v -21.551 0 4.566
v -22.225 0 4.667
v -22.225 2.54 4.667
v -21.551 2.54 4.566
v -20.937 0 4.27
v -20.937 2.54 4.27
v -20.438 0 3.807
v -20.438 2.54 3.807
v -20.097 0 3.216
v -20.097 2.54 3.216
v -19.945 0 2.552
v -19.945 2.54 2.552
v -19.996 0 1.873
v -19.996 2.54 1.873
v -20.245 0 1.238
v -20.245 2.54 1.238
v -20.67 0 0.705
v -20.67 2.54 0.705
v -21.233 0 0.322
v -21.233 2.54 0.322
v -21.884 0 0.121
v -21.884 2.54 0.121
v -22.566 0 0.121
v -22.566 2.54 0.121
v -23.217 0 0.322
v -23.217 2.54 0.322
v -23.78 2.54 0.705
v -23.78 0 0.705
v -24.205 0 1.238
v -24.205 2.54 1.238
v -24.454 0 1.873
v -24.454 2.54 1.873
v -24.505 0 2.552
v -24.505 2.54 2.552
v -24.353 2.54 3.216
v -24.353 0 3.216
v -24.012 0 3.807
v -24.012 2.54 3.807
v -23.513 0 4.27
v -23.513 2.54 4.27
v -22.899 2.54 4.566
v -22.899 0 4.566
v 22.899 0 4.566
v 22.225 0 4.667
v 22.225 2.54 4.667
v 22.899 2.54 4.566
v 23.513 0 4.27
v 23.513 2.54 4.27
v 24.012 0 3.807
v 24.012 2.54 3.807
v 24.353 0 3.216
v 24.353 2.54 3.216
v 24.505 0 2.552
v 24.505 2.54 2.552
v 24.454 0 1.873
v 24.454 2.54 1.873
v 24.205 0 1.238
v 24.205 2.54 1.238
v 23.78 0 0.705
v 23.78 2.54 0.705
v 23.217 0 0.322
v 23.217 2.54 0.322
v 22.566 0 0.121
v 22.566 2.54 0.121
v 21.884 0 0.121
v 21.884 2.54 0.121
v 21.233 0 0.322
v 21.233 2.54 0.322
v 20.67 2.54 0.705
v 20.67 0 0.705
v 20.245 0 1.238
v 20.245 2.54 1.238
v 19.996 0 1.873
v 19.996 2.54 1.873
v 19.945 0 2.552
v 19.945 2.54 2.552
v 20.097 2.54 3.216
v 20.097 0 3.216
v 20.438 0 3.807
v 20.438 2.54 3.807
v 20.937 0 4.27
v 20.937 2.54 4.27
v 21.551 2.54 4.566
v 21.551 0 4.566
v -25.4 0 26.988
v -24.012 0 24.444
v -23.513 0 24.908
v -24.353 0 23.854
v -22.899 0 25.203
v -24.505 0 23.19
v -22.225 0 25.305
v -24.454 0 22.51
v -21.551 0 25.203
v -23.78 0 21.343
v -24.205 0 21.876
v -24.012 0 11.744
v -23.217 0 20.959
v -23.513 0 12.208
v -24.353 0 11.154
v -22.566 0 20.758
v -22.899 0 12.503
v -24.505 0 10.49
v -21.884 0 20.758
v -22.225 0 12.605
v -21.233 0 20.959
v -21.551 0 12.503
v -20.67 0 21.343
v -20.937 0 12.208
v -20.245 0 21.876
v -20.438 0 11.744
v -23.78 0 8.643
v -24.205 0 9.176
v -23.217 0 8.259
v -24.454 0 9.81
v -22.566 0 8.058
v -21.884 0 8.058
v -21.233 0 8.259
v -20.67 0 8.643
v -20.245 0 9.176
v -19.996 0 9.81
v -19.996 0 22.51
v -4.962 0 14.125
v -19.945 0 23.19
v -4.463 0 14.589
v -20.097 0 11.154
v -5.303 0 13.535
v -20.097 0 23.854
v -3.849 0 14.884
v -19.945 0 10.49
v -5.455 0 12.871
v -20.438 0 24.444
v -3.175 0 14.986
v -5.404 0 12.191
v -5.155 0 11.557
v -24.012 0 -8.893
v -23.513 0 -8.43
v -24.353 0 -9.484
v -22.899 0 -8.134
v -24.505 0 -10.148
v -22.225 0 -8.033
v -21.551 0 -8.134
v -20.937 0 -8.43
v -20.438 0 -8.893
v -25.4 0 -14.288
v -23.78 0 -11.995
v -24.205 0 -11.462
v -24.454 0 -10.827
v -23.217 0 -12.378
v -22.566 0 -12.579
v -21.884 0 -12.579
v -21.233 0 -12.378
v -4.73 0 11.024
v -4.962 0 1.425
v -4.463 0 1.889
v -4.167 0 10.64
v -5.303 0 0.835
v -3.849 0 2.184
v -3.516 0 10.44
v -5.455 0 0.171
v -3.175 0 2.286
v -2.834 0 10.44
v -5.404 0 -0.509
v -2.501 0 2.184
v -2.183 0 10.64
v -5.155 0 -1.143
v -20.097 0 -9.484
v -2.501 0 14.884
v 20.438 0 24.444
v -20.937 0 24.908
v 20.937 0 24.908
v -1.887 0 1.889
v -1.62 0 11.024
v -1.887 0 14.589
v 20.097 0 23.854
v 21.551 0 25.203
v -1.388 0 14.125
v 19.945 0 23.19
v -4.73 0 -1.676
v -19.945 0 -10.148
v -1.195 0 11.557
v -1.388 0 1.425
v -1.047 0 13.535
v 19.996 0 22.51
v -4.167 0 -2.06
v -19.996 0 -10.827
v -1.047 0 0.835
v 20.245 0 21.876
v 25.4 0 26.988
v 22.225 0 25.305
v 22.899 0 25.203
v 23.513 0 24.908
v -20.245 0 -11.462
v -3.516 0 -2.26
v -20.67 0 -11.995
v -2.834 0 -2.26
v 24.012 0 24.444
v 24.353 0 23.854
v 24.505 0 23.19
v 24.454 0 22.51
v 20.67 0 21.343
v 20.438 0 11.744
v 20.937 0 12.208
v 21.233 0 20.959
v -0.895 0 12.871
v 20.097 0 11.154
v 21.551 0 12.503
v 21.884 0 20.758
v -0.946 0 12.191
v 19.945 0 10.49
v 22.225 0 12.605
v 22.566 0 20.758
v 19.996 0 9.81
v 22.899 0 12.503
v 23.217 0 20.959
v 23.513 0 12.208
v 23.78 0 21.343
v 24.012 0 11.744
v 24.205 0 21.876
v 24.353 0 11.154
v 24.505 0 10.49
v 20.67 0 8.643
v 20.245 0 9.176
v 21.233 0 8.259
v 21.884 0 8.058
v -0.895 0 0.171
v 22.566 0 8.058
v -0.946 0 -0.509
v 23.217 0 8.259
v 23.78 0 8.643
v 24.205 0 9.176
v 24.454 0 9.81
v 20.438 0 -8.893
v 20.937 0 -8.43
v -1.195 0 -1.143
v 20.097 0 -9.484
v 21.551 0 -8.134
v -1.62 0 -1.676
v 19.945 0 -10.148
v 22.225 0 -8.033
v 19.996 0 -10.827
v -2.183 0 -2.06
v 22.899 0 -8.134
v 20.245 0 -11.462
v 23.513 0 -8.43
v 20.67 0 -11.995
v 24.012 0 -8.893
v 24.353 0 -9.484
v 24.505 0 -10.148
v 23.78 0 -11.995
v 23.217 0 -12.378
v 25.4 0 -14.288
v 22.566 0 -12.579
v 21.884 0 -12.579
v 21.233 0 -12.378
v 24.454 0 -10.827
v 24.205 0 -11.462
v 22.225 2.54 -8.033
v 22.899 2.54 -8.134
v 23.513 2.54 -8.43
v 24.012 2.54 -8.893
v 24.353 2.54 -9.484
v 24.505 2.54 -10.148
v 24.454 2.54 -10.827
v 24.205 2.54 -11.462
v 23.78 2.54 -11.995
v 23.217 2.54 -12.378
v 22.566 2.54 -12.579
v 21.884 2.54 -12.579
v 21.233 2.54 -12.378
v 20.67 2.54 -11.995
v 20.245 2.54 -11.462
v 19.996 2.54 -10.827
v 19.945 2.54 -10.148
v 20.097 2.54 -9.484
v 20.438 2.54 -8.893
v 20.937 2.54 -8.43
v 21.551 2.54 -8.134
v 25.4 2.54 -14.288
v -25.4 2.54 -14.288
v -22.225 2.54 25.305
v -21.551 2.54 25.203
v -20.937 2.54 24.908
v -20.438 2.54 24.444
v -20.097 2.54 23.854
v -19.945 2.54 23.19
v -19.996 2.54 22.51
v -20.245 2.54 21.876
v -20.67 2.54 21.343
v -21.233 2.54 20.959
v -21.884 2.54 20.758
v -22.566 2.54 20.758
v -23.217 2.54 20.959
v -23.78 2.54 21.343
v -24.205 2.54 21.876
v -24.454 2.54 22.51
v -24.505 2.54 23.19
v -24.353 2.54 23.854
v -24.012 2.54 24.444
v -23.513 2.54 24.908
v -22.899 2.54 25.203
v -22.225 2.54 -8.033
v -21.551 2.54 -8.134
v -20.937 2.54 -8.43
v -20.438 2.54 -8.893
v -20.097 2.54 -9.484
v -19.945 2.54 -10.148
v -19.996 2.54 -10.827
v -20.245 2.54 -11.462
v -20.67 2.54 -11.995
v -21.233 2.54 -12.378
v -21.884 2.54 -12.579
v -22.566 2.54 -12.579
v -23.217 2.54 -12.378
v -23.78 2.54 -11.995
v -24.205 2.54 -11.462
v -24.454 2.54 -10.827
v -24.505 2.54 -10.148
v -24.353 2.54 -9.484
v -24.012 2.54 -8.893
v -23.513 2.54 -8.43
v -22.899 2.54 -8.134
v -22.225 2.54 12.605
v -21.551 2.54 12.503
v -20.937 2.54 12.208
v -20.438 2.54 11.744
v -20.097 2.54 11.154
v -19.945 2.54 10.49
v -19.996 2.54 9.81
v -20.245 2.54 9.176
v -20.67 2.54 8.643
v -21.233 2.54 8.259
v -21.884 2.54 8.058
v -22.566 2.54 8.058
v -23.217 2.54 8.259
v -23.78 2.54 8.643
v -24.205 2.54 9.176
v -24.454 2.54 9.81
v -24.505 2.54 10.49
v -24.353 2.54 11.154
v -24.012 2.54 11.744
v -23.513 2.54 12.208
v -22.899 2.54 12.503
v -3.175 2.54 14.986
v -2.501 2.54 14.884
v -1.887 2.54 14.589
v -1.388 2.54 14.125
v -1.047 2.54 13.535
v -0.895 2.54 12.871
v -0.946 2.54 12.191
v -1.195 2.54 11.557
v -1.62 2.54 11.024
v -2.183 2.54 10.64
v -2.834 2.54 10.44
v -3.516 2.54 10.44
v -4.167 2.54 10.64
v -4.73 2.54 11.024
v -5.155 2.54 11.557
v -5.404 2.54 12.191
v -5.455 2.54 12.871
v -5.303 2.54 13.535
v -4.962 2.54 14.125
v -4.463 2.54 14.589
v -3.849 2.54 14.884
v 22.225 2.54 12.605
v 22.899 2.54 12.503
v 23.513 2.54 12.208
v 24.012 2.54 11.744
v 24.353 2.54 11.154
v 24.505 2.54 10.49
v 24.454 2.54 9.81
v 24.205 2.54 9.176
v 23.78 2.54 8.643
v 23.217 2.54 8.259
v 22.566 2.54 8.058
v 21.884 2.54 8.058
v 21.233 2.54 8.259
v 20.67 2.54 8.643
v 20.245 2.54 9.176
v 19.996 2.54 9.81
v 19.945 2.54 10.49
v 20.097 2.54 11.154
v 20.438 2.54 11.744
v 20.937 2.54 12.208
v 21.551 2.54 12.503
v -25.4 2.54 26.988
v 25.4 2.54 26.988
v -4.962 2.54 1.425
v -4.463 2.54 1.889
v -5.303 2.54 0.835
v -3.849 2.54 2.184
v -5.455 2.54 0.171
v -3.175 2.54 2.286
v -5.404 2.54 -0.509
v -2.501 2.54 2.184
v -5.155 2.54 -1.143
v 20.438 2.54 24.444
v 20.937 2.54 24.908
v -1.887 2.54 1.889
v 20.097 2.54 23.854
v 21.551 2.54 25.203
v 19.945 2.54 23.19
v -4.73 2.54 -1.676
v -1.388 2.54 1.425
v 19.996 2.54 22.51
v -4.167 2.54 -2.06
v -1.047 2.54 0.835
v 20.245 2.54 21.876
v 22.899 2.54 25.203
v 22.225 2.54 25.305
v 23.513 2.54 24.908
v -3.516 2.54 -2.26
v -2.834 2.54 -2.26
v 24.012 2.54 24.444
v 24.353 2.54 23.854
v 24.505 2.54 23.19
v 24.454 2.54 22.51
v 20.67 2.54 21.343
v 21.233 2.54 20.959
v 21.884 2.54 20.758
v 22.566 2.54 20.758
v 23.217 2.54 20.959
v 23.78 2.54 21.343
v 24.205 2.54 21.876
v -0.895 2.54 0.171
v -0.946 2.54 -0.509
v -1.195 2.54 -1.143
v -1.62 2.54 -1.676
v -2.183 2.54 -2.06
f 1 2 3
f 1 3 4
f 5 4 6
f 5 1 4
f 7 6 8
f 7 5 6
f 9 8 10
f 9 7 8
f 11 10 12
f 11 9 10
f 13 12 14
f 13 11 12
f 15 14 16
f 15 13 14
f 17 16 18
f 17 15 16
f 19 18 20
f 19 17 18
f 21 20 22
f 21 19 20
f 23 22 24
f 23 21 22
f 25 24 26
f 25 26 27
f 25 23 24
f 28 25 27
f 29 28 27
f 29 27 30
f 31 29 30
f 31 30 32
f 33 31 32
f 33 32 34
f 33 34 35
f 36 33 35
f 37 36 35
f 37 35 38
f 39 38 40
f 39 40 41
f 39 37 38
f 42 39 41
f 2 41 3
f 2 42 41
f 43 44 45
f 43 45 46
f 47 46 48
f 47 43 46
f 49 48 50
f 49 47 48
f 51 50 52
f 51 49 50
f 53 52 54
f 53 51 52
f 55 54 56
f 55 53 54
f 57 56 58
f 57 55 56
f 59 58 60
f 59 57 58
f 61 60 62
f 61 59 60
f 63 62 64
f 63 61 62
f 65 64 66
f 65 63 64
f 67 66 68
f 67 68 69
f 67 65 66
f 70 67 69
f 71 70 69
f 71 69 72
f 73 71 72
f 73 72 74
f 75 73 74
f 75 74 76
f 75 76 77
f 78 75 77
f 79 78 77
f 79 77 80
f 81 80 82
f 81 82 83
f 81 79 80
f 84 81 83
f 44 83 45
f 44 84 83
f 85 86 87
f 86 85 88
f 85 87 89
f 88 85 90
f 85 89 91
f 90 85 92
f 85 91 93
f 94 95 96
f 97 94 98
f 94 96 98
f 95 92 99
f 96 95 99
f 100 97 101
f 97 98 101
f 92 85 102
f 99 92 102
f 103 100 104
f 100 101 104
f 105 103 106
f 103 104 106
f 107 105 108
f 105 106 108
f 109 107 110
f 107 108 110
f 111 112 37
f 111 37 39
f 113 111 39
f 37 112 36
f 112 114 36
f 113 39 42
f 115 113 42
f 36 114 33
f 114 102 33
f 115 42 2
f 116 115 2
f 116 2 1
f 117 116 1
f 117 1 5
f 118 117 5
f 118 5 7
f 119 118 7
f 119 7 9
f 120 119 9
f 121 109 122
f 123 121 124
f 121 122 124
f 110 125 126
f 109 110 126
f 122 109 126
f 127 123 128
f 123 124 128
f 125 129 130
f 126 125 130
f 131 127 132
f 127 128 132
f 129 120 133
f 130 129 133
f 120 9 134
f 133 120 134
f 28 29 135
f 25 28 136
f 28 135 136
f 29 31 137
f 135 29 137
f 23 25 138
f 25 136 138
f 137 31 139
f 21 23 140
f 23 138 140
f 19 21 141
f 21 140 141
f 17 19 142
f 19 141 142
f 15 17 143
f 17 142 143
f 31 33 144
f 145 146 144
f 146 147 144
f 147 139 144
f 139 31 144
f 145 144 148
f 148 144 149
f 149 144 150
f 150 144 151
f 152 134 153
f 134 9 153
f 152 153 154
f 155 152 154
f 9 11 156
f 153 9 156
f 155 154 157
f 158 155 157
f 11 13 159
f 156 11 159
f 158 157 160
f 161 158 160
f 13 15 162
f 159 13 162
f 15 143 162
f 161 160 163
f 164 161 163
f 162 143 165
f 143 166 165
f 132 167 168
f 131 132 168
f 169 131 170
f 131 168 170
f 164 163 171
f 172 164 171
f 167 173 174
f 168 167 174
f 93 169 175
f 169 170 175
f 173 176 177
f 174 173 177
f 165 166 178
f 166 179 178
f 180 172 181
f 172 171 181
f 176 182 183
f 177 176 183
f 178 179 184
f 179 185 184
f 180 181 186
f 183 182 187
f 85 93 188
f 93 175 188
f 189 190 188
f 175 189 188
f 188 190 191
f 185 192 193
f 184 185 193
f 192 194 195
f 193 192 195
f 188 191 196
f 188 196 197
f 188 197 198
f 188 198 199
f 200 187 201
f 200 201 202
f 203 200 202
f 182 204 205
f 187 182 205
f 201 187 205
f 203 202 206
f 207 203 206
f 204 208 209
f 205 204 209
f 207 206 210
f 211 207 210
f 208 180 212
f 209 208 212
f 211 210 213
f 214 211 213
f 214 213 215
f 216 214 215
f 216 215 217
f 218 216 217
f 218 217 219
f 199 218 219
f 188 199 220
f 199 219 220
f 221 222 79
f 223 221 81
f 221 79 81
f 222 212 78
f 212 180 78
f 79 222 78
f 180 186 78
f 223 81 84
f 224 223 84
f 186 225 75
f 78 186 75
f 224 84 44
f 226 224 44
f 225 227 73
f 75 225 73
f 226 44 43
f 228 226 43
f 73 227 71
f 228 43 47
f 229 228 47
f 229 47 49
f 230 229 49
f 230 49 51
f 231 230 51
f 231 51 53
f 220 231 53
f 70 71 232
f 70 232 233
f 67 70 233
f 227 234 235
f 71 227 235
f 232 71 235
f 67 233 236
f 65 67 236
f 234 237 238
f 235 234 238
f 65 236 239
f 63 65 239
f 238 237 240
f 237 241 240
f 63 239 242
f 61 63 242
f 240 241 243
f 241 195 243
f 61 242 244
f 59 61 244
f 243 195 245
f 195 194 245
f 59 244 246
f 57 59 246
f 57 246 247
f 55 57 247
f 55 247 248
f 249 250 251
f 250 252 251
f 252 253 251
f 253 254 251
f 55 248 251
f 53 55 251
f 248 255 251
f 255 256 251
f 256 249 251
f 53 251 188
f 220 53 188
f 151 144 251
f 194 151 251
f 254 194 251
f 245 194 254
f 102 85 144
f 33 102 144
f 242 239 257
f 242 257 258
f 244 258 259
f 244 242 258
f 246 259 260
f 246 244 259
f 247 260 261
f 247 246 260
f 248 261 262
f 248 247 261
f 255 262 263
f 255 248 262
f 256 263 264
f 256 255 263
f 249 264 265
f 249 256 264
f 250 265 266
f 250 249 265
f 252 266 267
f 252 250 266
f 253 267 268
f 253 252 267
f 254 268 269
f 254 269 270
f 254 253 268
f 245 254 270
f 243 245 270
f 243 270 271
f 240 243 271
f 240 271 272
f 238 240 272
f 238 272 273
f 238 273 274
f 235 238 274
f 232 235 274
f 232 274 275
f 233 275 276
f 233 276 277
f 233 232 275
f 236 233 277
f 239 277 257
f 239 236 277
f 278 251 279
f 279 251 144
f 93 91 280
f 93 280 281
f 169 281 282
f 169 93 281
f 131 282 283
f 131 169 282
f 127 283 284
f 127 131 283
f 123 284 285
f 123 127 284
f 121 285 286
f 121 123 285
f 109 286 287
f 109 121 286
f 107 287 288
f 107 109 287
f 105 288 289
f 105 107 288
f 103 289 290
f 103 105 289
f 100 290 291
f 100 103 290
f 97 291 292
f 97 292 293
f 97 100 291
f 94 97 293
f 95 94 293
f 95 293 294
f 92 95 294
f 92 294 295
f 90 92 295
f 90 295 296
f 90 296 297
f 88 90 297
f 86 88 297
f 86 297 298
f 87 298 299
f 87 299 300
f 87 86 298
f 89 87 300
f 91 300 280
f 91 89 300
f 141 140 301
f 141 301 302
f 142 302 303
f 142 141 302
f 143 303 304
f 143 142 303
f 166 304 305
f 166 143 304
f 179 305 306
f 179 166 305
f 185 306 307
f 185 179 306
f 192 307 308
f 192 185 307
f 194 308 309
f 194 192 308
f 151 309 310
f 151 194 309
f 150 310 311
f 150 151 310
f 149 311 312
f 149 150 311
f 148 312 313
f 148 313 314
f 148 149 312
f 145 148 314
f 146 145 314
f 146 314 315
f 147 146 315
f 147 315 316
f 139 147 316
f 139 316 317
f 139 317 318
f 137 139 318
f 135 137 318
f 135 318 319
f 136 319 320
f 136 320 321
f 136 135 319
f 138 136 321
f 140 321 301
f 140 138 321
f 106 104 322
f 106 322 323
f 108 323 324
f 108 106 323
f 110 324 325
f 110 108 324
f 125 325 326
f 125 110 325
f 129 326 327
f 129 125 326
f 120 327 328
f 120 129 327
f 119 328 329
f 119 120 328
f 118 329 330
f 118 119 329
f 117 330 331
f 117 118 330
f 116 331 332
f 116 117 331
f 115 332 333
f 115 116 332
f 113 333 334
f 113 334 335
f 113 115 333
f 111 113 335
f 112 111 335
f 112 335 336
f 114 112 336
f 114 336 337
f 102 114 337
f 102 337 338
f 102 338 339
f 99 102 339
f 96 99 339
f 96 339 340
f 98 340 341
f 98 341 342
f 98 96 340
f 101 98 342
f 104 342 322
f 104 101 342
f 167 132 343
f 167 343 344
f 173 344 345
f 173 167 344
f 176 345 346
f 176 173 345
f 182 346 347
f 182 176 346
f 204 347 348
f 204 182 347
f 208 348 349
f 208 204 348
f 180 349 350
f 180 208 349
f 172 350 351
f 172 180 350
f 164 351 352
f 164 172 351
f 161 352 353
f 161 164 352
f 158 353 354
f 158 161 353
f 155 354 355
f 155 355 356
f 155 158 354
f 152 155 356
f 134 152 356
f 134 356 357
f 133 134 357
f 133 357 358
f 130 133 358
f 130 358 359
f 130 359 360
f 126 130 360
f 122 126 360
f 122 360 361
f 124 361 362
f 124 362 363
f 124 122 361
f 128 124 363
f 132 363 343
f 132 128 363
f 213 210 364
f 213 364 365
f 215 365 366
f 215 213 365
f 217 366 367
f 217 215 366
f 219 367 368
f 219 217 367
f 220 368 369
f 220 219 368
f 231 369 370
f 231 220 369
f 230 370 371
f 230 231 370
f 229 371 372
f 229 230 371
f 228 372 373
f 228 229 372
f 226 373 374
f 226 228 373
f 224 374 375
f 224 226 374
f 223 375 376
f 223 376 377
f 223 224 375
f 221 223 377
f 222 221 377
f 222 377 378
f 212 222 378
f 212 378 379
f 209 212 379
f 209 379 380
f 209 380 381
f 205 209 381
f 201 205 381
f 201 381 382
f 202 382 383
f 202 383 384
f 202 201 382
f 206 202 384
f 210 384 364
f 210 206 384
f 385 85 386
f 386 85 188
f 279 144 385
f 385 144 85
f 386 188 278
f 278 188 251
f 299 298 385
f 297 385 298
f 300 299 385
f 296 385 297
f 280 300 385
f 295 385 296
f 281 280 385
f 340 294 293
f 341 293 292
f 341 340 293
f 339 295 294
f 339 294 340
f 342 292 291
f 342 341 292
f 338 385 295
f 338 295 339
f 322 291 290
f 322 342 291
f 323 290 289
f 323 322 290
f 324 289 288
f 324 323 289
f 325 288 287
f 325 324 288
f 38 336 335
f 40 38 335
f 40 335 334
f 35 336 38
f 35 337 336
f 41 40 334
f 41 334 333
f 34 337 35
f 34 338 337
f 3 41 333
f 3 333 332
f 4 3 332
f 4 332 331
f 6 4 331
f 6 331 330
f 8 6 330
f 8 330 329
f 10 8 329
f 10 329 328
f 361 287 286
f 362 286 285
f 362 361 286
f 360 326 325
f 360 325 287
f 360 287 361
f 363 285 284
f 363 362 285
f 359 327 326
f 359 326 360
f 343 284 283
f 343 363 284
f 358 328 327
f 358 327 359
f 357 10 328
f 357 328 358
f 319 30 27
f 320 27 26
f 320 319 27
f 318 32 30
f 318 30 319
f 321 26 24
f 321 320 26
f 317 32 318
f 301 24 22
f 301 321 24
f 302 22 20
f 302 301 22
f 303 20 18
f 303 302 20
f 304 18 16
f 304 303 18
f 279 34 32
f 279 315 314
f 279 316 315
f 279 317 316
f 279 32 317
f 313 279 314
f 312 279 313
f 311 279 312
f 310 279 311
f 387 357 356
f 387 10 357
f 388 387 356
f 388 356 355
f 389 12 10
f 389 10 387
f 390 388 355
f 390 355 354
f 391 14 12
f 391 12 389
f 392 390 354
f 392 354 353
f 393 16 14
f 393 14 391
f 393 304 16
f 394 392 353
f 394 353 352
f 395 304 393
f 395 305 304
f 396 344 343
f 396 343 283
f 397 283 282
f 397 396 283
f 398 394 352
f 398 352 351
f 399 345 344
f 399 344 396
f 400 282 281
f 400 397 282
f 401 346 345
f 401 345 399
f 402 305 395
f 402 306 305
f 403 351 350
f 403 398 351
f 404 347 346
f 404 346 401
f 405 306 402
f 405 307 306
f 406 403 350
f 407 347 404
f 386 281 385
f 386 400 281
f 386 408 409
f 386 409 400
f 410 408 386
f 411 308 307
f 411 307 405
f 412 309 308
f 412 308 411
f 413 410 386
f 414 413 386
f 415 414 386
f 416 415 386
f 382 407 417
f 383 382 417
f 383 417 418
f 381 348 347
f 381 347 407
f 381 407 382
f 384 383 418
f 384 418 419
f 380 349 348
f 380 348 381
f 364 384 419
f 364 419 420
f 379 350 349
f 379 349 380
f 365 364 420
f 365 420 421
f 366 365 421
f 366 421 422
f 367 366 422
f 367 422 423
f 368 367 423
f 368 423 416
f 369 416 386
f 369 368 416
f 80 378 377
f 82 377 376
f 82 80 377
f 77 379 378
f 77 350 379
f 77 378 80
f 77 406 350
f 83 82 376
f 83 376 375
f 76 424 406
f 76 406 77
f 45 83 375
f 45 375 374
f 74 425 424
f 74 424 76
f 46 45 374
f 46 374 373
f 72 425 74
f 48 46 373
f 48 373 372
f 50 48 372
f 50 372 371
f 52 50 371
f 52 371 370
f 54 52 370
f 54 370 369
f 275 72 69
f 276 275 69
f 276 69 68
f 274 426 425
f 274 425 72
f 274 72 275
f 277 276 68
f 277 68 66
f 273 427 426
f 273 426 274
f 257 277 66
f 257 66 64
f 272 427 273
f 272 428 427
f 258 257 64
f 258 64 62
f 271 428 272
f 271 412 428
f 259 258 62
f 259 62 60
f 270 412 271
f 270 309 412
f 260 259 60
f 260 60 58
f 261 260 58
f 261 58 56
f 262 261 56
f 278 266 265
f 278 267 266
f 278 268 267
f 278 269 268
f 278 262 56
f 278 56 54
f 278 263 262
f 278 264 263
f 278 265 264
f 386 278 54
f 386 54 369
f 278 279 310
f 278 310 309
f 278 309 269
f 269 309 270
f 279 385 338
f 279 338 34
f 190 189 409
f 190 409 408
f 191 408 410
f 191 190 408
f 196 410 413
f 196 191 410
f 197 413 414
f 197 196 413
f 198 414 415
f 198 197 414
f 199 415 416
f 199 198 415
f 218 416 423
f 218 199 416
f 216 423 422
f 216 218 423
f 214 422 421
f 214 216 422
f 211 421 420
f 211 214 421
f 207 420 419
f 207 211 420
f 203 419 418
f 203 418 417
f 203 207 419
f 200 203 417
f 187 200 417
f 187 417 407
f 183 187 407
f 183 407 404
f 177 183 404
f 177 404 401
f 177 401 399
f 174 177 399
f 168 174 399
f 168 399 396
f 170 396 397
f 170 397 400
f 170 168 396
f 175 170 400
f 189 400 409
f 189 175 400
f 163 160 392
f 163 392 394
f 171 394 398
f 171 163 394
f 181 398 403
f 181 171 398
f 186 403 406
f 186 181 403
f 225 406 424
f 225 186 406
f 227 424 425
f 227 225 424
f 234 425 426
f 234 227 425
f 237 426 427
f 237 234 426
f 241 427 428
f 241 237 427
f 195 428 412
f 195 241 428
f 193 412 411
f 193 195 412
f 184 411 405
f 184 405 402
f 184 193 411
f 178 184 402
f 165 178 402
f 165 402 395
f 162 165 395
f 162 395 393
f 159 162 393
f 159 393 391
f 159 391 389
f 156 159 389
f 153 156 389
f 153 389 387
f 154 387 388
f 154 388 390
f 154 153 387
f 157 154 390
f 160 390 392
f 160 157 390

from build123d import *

# Parameters (mm, degrees)
SKETCH1_R           = 2.286
BOSS_EXTRUDE1_DEPTH = 2.54


with BuildPart() as part:
    # Sketch1 → Boss-Extrude1 (new body)
    with BuildSketch(Plane(origin=(0, 0, 0), x_dir=(1, 0, 0), z_dir=(0, 1, 0))):
        Polygon((-25.4, -14.2875), (-25.4, -26.9875), (25.4, -26.9875), (25.4, -14.2875), (25.4, 14.2875), (-25.4, 14.2875), align=None)
        with Locations(Location((-22.225, 10.31875, 0), (0, 0, 270))):
            Circle(SKETCH1_R, mode=Mode.SUBTRACT)
        with Locations(Location((-22.225, -10.31875, 0), (0, 0, 270))):
            Circle(SKETCH1_R, mode=Mode.SUBTRACT)
        with Locations(Location((22.225, -10.31875, 0), (0, 0, 270))):
            Circle(SKETCH1_R, mode=Mode.SUBTRACT)
        with Locations(Location((22.225, 10.31875, 0), (0, 0, 270))):
            Circle(SKETCH1_R, mode=Mode.SUBTRACT)
        with Locations(Location((-22.225, -2.38125, 0), (0, 0, 270))):
            Circle(SKETCH1_R, mode=Mode.SUBTRACT)
        with Locations(Location((-22.225, -23.01875, 0), (0, 0, 270))):
            Circle(SKETCH1_R, mode=Mode.SUBTRACT)
        with Locations(Location((22.225, -23.01875, 0), (0, 0, 270))):
            Circle(SKETCH1_R, mode=Mode.SUBTRACT)
        with Locations(Location((22.225, -2.38125, 0), (0, 0, 270))):
            Circle(SKETCH1_R, mode=Mode.SUBTRACT)
        with Locations(Location((-3.175, 0, 0), (0, 0, 270))):
            Circle(SKETCH1_R, mode=Mode.SUBTRACT)
        with Locations(Location((-3.175, -12.7, 0), (0, 0, 270))):
            Circle(SKETCH1_R, mode=Mode.SUBTRACT)
    extrude(amount=BOSS_EXTRUDE1_DEPTH)


solid = part.part
